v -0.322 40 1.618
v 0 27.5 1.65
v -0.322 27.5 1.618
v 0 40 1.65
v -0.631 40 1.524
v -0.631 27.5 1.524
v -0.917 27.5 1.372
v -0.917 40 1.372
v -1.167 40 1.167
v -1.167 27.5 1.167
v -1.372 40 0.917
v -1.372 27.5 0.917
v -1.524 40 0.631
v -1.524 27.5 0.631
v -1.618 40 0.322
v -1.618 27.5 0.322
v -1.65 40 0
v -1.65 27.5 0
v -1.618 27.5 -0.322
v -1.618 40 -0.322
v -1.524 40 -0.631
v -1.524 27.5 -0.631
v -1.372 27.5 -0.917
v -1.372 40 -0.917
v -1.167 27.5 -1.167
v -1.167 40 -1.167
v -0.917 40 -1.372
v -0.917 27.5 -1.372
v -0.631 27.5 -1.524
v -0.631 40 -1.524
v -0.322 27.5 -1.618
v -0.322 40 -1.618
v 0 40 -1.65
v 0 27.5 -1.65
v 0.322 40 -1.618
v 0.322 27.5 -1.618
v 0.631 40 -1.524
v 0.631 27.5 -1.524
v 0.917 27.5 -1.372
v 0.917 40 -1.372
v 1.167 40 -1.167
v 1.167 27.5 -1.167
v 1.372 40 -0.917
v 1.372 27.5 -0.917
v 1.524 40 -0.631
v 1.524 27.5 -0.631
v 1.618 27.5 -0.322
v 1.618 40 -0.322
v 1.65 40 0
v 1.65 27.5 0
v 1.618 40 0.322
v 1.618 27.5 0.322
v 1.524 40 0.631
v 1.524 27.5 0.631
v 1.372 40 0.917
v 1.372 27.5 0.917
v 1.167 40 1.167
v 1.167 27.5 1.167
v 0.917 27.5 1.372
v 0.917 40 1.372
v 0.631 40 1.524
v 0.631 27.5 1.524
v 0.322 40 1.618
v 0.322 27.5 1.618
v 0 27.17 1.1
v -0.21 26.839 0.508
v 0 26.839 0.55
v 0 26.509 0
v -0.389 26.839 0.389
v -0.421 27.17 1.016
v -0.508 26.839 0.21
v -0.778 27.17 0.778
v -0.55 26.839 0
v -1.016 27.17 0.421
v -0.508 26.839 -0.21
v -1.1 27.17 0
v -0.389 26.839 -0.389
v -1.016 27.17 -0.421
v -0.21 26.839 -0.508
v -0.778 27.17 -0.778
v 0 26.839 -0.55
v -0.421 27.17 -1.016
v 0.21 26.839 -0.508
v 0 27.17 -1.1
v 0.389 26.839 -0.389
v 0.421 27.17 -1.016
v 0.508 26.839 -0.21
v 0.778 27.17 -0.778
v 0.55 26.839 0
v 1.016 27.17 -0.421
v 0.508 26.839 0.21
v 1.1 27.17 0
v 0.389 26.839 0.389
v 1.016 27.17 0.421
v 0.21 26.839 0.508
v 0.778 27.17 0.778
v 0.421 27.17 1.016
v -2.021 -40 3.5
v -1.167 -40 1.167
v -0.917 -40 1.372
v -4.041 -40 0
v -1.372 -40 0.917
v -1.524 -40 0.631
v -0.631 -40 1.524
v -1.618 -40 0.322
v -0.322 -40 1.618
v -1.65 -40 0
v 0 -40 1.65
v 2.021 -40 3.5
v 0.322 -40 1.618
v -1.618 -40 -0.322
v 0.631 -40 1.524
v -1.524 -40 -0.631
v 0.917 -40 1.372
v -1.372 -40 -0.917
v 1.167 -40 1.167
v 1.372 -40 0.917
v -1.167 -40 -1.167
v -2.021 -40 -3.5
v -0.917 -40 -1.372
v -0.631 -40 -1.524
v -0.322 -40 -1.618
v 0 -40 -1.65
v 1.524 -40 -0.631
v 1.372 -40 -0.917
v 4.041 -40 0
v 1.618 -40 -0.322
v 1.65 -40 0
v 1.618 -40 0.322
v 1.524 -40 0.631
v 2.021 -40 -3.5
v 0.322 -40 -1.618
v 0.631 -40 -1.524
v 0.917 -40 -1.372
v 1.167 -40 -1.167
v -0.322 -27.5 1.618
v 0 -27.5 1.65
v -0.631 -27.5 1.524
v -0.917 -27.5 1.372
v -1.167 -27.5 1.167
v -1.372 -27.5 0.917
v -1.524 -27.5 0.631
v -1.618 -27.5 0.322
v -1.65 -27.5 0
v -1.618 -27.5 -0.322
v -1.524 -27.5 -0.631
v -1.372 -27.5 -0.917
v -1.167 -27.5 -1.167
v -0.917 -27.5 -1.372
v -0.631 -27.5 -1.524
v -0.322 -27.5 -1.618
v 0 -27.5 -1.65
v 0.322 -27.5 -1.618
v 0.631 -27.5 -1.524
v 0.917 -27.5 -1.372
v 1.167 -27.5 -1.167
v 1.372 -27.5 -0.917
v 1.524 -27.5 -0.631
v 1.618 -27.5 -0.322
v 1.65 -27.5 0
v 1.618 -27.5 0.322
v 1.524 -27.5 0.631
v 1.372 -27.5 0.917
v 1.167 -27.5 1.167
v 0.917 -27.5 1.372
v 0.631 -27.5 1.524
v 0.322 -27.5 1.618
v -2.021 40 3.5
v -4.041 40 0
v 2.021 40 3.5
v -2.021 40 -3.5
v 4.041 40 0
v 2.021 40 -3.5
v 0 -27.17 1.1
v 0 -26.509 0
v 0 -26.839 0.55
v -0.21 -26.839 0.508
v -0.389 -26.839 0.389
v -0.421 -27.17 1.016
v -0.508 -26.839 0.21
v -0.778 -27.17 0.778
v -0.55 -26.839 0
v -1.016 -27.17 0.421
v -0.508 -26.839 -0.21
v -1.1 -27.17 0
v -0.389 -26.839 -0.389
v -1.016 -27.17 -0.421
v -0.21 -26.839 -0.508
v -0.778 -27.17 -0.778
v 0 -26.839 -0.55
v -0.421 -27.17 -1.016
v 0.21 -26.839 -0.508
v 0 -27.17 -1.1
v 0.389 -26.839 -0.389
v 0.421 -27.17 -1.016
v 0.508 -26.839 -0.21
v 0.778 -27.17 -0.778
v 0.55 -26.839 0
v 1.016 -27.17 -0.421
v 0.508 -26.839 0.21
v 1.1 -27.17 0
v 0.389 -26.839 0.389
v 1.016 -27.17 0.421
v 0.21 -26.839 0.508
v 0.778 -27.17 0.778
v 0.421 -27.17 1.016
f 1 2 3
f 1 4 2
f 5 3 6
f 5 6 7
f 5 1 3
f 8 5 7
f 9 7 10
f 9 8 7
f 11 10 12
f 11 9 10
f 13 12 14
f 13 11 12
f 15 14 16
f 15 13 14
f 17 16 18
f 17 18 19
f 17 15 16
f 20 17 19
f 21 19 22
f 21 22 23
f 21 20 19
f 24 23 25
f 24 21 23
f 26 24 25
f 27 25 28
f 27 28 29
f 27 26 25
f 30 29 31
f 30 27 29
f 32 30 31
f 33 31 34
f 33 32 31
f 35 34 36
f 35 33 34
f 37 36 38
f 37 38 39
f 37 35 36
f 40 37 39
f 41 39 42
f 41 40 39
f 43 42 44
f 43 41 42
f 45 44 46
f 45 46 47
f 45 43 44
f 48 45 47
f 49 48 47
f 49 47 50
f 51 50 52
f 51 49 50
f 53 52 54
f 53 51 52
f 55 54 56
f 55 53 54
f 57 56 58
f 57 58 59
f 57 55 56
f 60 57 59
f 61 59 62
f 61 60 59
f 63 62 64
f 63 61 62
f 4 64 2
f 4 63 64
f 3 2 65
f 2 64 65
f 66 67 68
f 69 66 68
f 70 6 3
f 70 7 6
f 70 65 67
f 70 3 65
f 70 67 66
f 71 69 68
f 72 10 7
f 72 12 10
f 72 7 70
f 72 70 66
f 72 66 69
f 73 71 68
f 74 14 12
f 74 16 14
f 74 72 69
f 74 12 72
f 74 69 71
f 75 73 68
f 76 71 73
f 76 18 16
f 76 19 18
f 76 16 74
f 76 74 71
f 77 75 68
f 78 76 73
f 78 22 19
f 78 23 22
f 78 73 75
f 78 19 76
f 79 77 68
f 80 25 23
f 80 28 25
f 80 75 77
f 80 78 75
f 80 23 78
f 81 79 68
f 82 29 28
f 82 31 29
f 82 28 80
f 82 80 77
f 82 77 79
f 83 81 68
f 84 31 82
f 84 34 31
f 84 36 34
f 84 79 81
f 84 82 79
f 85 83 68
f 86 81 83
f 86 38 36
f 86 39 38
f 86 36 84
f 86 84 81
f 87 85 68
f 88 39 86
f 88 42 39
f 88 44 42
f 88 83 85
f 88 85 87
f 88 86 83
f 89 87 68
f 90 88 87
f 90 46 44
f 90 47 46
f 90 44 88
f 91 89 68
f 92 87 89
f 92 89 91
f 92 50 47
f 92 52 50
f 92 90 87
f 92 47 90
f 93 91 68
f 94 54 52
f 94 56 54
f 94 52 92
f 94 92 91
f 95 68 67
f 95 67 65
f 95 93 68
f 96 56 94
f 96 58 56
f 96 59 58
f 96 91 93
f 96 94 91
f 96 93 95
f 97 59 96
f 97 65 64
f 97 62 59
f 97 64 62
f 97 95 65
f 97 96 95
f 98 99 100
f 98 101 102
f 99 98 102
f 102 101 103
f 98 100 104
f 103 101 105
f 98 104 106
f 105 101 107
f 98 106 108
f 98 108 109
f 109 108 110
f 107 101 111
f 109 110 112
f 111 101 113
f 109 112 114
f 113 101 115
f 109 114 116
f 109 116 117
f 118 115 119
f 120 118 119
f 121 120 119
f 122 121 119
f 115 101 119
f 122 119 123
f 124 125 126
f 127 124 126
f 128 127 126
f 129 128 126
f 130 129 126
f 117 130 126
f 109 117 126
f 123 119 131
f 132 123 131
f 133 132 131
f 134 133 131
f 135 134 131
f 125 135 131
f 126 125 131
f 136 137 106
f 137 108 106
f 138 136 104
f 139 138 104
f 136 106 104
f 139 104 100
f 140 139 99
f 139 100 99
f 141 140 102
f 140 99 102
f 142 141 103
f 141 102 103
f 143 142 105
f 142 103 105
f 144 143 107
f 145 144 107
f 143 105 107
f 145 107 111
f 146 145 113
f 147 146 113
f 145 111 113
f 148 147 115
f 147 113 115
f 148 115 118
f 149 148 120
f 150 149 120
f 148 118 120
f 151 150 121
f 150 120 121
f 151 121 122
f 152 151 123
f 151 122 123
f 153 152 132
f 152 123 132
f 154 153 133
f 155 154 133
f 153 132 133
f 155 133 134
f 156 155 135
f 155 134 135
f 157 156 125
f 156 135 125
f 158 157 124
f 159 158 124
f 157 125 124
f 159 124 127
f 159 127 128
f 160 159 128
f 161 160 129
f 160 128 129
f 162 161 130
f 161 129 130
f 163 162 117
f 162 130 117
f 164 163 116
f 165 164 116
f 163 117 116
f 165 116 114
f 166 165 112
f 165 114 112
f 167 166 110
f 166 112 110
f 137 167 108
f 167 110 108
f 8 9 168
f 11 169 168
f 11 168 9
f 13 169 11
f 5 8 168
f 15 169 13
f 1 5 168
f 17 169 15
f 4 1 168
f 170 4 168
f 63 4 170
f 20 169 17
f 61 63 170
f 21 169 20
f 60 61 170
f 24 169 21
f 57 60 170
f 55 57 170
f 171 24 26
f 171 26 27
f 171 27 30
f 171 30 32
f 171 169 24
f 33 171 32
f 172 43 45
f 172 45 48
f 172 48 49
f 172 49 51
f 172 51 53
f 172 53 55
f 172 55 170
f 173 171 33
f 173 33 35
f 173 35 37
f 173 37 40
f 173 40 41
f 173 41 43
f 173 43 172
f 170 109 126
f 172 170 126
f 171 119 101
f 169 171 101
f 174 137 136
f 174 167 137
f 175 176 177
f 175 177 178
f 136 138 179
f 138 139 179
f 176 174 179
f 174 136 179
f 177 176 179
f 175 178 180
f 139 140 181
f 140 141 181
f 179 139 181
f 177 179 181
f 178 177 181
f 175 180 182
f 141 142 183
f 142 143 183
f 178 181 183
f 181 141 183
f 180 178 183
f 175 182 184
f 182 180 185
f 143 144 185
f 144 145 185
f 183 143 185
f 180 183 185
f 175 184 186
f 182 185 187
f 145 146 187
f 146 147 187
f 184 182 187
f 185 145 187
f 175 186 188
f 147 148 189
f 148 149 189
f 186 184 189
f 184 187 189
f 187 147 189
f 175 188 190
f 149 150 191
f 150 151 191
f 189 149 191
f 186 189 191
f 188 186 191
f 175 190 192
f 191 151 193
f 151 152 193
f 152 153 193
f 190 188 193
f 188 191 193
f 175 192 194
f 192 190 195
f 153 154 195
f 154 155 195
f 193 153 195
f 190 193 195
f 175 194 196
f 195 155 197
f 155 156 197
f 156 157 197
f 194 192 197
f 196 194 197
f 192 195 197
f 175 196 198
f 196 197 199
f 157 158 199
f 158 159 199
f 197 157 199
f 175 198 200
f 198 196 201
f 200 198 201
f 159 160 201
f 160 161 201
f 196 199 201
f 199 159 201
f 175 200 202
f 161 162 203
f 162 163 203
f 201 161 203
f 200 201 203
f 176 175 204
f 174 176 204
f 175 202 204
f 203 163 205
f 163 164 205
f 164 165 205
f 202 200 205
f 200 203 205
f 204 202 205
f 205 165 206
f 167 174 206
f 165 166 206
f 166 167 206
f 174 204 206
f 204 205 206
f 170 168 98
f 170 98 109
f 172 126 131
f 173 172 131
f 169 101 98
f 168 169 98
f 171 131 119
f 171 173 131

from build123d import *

# Parameters (mm, degrees)
SALIENTE_EXTRUIR1_DEPTH = 40


with BuildPart() as part:
    # Croquis1 → Saliente-Extruir1 (new, symmetric)
    with BuildSketch(Plane(origin=(0, 0, 0), x_dir=(1, 0, 0), z_dir=(0, 1, 0))):
        Polygon((-2.020725942, 3.5), (-4.041451884, 0), (-2.020725942, -3.5), (2.020725942, -3.5), (4.041451884, 0), (2.020725942, 3.5), align=None)
    extrude(amount=SALIENTE_EXTRUIR1_DEPTH, both=True)

    # Croquis4 → Taladro roscado M41 (revolve, cut)
    with BuildSketch(Plane(origin=(0, 40, 0), x_dir=(0, 0, 1), z_dir=(1, 0, 0))):
        Polygon((0, 0), (0, 13.491420021), (1.65, 12.5), (1.65, 0), align=None)
    taladro_roscado_m41 = revolve(axis=Axis((0, 46.35, 0), (0, -1, 0)), mode=Mode.SUBTRACT)

    # Simetría1: Taladro roscado M41 across plane
    add(taladro_roscado_m41.mirror(Plane.ZX), mode=Mode.SUBTRACT)


solid = part.part
